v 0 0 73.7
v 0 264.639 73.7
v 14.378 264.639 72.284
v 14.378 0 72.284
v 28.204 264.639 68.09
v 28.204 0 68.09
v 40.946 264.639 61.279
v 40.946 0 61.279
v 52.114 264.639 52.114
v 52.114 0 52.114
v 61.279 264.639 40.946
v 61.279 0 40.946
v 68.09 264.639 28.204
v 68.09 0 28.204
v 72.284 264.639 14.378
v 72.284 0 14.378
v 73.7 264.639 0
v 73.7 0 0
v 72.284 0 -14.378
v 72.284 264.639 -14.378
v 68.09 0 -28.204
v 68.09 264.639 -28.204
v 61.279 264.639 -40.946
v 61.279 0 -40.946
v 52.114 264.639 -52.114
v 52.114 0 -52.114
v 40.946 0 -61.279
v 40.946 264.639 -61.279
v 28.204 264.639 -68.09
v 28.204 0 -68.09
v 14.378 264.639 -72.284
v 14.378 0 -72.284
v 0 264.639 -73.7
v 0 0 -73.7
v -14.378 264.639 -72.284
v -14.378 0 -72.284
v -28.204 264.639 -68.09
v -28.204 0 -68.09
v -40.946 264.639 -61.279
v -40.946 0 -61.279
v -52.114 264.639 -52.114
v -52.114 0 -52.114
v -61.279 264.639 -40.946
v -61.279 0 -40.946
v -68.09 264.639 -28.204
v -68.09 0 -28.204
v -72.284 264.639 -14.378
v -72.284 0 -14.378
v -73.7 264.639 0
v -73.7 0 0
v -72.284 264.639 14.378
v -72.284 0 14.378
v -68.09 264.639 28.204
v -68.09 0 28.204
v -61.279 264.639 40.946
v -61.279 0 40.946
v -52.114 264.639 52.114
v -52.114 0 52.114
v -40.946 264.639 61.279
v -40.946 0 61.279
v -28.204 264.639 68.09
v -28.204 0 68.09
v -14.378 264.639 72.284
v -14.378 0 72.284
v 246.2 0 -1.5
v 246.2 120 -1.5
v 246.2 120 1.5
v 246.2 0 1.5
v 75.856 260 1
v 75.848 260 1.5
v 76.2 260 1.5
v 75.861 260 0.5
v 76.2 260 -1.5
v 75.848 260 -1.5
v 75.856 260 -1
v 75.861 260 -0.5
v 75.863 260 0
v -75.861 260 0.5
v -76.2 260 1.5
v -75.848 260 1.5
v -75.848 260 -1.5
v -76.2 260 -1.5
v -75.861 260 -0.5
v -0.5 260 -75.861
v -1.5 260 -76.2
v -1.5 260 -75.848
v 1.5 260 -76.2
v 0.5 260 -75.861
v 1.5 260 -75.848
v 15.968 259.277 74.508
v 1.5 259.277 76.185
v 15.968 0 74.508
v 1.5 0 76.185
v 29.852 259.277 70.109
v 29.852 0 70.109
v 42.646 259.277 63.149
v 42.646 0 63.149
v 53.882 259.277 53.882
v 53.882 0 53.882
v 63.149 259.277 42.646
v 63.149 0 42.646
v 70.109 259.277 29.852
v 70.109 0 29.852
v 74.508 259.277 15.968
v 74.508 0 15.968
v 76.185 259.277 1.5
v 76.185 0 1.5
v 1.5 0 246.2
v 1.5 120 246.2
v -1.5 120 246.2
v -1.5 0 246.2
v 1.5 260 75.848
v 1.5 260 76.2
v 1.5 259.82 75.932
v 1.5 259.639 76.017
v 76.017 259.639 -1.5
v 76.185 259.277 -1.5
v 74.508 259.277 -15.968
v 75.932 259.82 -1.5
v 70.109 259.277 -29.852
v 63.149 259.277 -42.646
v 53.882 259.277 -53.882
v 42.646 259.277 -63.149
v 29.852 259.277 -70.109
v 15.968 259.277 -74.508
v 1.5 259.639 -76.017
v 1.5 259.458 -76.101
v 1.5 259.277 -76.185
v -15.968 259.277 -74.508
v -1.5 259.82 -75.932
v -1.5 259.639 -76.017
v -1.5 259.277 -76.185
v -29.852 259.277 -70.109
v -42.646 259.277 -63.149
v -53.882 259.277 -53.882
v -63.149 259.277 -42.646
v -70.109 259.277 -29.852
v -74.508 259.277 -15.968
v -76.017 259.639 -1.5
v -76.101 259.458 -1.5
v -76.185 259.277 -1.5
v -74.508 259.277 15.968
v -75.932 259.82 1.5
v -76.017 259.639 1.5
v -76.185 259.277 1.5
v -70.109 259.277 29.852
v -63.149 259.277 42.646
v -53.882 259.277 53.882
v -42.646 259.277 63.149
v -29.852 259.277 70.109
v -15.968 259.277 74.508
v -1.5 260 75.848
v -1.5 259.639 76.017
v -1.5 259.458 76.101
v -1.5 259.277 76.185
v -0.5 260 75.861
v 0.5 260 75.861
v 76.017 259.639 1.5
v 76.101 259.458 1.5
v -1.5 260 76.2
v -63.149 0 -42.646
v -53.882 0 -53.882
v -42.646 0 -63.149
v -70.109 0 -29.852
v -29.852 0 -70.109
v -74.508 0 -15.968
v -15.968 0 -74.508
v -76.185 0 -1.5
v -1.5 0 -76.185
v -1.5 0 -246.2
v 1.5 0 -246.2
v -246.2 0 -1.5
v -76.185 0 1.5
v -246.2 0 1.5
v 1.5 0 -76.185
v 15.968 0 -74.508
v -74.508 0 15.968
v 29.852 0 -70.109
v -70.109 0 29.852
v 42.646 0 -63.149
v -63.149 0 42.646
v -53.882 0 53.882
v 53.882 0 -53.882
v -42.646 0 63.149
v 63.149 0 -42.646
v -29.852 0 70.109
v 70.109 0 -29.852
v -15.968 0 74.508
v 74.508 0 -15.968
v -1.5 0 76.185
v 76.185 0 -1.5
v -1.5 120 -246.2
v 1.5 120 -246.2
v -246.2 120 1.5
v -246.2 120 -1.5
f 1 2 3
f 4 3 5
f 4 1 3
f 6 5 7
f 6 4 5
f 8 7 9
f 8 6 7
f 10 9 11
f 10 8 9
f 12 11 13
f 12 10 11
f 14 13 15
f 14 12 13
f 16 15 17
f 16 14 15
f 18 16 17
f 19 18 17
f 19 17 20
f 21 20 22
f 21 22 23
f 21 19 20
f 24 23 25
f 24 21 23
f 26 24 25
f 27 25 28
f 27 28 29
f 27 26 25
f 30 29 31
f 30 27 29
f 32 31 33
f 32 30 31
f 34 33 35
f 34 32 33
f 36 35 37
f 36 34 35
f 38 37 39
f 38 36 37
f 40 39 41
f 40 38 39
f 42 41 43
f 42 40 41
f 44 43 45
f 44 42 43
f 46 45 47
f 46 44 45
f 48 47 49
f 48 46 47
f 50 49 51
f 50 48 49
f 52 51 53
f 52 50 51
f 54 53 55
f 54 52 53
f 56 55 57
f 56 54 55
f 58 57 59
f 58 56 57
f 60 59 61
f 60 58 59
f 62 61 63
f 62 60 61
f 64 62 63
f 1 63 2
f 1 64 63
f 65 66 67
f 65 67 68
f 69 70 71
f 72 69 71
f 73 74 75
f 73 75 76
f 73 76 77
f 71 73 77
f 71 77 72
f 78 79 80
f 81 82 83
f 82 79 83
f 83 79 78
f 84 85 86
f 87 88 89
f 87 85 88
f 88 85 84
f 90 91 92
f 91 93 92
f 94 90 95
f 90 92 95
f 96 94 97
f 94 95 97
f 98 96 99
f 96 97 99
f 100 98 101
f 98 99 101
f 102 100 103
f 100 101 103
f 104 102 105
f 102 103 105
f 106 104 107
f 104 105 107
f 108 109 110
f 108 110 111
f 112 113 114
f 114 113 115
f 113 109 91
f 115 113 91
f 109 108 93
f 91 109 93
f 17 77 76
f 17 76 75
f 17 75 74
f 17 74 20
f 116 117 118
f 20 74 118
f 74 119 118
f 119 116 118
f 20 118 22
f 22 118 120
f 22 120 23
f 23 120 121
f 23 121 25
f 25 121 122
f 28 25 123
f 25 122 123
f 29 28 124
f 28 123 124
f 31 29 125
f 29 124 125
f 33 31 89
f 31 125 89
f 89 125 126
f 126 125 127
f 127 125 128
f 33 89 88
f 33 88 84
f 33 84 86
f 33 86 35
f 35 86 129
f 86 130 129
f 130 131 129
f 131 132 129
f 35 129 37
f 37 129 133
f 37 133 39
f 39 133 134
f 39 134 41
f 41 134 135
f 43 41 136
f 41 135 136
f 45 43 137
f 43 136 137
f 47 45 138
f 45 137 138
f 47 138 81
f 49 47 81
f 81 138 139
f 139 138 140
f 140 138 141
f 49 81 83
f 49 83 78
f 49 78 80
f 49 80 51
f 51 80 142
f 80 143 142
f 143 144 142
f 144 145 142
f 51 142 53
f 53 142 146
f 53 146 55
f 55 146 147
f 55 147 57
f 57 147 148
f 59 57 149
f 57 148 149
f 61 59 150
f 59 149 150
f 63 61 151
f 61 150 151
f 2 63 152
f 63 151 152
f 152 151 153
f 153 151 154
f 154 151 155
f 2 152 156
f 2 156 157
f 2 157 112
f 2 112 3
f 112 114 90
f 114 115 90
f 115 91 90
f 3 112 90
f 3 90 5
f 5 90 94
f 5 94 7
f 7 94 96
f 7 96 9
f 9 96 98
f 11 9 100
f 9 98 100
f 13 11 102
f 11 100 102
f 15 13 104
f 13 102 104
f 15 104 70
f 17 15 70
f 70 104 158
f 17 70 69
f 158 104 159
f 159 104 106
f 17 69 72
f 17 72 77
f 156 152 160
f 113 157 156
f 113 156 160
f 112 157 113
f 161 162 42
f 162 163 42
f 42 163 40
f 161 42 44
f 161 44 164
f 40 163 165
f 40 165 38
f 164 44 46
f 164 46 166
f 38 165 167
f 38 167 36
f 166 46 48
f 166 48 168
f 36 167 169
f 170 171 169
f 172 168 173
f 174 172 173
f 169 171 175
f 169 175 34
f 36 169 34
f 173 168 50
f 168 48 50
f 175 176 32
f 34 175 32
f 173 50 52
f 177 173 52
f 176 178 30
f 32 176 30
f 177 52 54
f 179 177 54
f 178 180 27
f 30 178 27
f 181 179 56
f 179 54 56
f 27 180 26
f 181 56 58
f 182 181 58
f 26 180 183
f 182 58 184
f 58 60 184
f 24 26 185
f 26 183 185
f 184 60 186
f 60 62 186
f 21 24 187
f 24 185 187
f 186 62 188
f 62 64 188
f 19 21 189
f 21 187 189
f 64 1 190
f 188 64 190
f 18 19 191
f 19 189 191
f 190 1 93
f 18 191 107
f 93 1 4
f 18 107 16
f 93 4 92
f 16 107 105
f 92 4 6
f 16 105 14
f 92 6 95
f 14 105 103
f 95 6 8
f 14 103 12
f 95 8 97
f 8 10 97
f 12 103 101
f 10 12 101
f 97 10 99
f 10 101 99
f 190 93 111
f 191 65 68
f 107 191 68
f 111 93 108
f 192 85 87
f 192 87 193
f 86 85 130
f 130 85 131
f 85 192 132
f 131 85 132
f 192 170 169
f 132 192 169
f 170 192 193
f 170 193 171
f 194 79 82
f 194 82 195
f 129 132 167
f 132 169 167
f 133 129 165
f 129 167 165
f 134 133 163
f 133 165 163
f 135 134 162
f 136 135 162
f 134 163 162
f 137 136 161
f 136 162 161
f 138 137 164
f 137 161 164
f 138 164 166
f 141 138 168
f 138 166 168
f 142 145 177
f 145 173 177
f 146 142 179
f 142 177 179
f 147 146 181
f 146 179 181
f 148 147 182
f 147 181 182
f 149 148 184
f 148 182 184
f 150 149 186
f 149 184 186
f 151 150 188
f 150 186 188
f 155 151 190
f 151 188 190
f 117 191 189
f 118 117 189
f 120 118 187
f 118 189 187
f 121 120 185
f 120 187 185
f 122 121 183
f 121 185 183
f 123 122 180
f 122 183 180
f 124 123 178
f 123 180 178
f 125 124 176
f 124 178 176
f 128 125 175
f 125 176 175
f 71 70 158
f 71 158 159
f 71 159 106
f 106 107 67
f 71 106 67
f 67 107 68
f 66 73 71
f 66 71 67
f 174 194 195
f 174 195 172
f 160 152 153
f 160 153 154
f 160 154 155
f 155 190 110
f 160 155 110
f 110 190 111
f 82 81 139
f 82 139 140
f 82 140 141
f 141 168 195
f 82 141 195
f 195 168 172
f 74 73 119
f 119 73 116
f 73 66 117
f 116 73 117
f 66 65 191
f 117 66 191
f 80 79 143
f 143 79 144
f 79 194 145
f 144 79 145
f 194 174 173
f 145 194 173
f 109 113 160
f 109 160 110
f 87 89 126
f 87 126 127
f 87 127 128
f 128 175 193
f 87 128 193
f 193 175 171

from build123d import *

# Parameters (mm, degrees)
SKETCH1_R                = 76.2
SKETCH1_R_2              = 73.7
BOSS_EXTRUDE1_DEPTH      = 260
BOSS_EXTRUDE2_DEPTH      = 1.5
BOSS_EXTRUDE2_DEPTH_BACK = 1.5
BOSS_EXTRUDE3_DEPTH      = 1.5
BOSS_EXTRUDE3_DEPTH_BACK = 1.5
SKETCH4_W                = 2
SKETCH4_H                = 260
CIRPATTERN1_COUNT        = 4
SKETCH6_R                = 73.7
BOSS_EXTRUDE4_DEPTH      = 10
CHAMFER1_START           = 264.638732699
CHAMFER1_2_OUTLINE_R     = 76.2
CHAMFER1_2_OUTLINE_R_2   = 73.7
CHAMFER1_2_DEPTH         = 5.361267301
CHAMFER1_START_2         = 258
CHAMFER1_3_DEPTH         = 2


with BuildPart() as part:
    # Sketch1 → Boss-Extrude1 (new body)
    with BuildSketch(Plane(origin=(0, 0, 0), x_dir=(1, 0, 0), z_dir=(0, 1, 0))):
        with Locations(Location((0, 0, 0), (0, 0, 270))):
            Circle(SKETCH1_R)
        with Locations(Location((0, 0, 0), (0, 0, 270))):
            Circle(SKETCH1_R_2, mode=Mode.SUBTRACT)
    extrude(amount=BOSS_EXTRUDE1_DEPTH)



with BuildPart() as body_2:
    # Sketch2 → Boss-Extrude2 (new, two sides: drawn at the far end of the back side and taken through both)
    with BuildSketch(Plane.XY.offset(-BOSS_EXTRUDE2_DEPTH_BACK)):
        Polygon((76.2, 0), (76.2, 260), (246.2, 120), (246.2, 0), align=None)
    extrude(amount=BOSS_EXTRUDE2_DEPTH + BOSS_EXTRUDE2_DEPTH_BACK)


with BuildPart() as part_1:
    add(part.part)

    add(body_2.part)  # Boss-Extrude3 merges body 2
    # Sketch4 → Boss-Extrude3 (add, two sides: drawn at the far end of the back side and taken through both)
    with BuildSketch(Plane.XY.offset(-BOSS_EXTRUDE3_DEPTH_BACK)):
        with Locations((75.2, 130)):
            Rectangle(SKETCH4_W, SKETCH4_H)
    extrude(amount=BOSS_EXTRUDE3_DEPTH + BOSS_EXTRUDE3_DEPTH_BACK)


with BuildPart() as cirpattern1_1:
    # CirPattern1: pattern copy
    add(part_1.part.rotate(Axis((0, 0, 0), (0, 1, 0)), 1 * 360 / CIRPATTERN1_COUNT))


with BuildPart() as cirpattern1_2:
    # CirPattern1: pattern copy
    add(part_1.part.rotate(Axis((0, 0, 0), (0, 1, 0)), 2 * 360 / CIRPATTERN1_COUNT))


with BuildPart() as cirpattern1_3:
    # CirPattern1: pattern copy
    add(part_1.part.rotate(Axis((0, 0, 0), (0, 1, 0)), 3 * 360 / CIRPATTERN1_COUNT))


with BuildPart() as part_2:
    add(part_1.part)

    add(cirpattern1_1.part)  # Boss-Extrude4 merges CirPattern1_1

    add(cirpattern1_2.part)  # Boss-Extrude4 merges CirPattern1_2

    add(cirpattern1_3.part)  # Boss-Extrude4 merges CirPattern1_3
    # Sketch6 → Boss-Extrude4 (add)
    with BuildSketch(Plane(origin=(0, 260, 0), x_dir=(1, 0, 0), z_dir=(0, 1, 0))):
        with BuildLine():
            ThreePointArc((76.18523479, -1.5), (76.2, 0), (76.18523479, 1.5))
            ThreePointArc((76.18523479, 1.5), (53.881536726, 53.881536726), (1.5, 76.18523479))
            ThreePointArc((1.5, 76.18523479), (0, 76.2), (-1.5, 76.18523479))
            ThreePointArc((-1.5, 76.18523479), (-53.881536726, -53.881536726), (76.18523479, -1.5))
        make_face()
        with Locations(Location((0, 0, 0), (0, 0, 270))):
            Circle(SKETCH6_R, mode=Mode.SUBTRACT)
    extrude(amount=BOSS_EXTRUDE4_DEPTH)

    # Chamfer1: read off the stored shape, not the designer's step
    # Chamfer1 outline → Chamfer1 (revolve, cut)
    with BuildSketch(Plane.XY):
        Polygon((73.7, 264.638732699), (76.2, 259.277465397), (76.2, 264.638732699), align=None)
    revolve(axis=Axis((0, 0, 0), (0, 1, 0)), mode=Mode.SUBTRACT)

    # Chamfer1 2 outline → Chamfer1 2 (cut)
    with BuildSketch(Plane(origin=(0, 0, 0), x_dir=(1, 0, 0), z_dir=(0, 1, 0)).offset(CHAMFER1_START)):
        Circle(CHAMFER1_2_OUTLINE_R)
        Circle(CHAMFER1_2_OUTLINE_R_2, mode=Mode.SUBTRACT)
    extrude(amount=CHAMFER1_2_DEPTH, mode=Mode.SUBTRACT)

    # Chamfer1 3 outline → Chamfer1 3 (add)
    with BuildSketch(Plane(origin=(0, 0, 0), x_dir=(1, 0, 0), z_dir=(0, 1, 0)).offset(CHAMFER1_START_2)):
        with BuildLine():
            ThreePointArc((76.18523479, -1.5), (76.2, 0), (76.18523479, 1.5))
            Line((76.18523479, 1.5), (75.848245783, 1.5))
            ThreePointArc((75.848245783, 1.5), (75.863076582, 0), (75.848245783, -1.5))
            Line((75.848245783, -1.5), (76.18523479, -1.5))
        make_face()
        with BuildLine():
            Line((1.5, 75.848245783), (1.5, 76.18523479))
            ThreePointArc((1.5, 76.18523479), (0, 76.2), (-1.5, 76.18523479))
            Line((-1.5, 76.18523479), (-1.5, 75.848245783))
            ThreePointArc((-1.5, 75.848245783), (0, 75.863076582), (1.5, 75.848245783))
        make_face()
        with BuildLine():
            ThreePointArc((-1.5, -76.18523479), (0, -76.2), (1.5, -76.18523479))
            Line((1.5, -76.18523479), (1.5, -75.848245783))
            ThreePointArc((1.5, -75.848245783), (0, -75.863076582), (-1.5, -75.848245783))
            Line((-1.5, -75.848245783), (-1.5, -76.18523479))
        make_face()
        with BuildLine():
            Line((-75.848245783, 1.5), (-76.18523479, 1.5))
            ThreePointArc((-76.18523479, 1.5), (-76.2, 0), (-76.18523479, -1.5))
            Line((-76.18523479, -1.5), (-75.848245783, -1.5))
            ThreePointArc((-75.848245783, -1.5), (-75.863076582, 0), (-75.848245783, 1.5))
        make_face()
    extrude(amount=CHAMFER1_3_DEPTH)


solid = part_2.part
